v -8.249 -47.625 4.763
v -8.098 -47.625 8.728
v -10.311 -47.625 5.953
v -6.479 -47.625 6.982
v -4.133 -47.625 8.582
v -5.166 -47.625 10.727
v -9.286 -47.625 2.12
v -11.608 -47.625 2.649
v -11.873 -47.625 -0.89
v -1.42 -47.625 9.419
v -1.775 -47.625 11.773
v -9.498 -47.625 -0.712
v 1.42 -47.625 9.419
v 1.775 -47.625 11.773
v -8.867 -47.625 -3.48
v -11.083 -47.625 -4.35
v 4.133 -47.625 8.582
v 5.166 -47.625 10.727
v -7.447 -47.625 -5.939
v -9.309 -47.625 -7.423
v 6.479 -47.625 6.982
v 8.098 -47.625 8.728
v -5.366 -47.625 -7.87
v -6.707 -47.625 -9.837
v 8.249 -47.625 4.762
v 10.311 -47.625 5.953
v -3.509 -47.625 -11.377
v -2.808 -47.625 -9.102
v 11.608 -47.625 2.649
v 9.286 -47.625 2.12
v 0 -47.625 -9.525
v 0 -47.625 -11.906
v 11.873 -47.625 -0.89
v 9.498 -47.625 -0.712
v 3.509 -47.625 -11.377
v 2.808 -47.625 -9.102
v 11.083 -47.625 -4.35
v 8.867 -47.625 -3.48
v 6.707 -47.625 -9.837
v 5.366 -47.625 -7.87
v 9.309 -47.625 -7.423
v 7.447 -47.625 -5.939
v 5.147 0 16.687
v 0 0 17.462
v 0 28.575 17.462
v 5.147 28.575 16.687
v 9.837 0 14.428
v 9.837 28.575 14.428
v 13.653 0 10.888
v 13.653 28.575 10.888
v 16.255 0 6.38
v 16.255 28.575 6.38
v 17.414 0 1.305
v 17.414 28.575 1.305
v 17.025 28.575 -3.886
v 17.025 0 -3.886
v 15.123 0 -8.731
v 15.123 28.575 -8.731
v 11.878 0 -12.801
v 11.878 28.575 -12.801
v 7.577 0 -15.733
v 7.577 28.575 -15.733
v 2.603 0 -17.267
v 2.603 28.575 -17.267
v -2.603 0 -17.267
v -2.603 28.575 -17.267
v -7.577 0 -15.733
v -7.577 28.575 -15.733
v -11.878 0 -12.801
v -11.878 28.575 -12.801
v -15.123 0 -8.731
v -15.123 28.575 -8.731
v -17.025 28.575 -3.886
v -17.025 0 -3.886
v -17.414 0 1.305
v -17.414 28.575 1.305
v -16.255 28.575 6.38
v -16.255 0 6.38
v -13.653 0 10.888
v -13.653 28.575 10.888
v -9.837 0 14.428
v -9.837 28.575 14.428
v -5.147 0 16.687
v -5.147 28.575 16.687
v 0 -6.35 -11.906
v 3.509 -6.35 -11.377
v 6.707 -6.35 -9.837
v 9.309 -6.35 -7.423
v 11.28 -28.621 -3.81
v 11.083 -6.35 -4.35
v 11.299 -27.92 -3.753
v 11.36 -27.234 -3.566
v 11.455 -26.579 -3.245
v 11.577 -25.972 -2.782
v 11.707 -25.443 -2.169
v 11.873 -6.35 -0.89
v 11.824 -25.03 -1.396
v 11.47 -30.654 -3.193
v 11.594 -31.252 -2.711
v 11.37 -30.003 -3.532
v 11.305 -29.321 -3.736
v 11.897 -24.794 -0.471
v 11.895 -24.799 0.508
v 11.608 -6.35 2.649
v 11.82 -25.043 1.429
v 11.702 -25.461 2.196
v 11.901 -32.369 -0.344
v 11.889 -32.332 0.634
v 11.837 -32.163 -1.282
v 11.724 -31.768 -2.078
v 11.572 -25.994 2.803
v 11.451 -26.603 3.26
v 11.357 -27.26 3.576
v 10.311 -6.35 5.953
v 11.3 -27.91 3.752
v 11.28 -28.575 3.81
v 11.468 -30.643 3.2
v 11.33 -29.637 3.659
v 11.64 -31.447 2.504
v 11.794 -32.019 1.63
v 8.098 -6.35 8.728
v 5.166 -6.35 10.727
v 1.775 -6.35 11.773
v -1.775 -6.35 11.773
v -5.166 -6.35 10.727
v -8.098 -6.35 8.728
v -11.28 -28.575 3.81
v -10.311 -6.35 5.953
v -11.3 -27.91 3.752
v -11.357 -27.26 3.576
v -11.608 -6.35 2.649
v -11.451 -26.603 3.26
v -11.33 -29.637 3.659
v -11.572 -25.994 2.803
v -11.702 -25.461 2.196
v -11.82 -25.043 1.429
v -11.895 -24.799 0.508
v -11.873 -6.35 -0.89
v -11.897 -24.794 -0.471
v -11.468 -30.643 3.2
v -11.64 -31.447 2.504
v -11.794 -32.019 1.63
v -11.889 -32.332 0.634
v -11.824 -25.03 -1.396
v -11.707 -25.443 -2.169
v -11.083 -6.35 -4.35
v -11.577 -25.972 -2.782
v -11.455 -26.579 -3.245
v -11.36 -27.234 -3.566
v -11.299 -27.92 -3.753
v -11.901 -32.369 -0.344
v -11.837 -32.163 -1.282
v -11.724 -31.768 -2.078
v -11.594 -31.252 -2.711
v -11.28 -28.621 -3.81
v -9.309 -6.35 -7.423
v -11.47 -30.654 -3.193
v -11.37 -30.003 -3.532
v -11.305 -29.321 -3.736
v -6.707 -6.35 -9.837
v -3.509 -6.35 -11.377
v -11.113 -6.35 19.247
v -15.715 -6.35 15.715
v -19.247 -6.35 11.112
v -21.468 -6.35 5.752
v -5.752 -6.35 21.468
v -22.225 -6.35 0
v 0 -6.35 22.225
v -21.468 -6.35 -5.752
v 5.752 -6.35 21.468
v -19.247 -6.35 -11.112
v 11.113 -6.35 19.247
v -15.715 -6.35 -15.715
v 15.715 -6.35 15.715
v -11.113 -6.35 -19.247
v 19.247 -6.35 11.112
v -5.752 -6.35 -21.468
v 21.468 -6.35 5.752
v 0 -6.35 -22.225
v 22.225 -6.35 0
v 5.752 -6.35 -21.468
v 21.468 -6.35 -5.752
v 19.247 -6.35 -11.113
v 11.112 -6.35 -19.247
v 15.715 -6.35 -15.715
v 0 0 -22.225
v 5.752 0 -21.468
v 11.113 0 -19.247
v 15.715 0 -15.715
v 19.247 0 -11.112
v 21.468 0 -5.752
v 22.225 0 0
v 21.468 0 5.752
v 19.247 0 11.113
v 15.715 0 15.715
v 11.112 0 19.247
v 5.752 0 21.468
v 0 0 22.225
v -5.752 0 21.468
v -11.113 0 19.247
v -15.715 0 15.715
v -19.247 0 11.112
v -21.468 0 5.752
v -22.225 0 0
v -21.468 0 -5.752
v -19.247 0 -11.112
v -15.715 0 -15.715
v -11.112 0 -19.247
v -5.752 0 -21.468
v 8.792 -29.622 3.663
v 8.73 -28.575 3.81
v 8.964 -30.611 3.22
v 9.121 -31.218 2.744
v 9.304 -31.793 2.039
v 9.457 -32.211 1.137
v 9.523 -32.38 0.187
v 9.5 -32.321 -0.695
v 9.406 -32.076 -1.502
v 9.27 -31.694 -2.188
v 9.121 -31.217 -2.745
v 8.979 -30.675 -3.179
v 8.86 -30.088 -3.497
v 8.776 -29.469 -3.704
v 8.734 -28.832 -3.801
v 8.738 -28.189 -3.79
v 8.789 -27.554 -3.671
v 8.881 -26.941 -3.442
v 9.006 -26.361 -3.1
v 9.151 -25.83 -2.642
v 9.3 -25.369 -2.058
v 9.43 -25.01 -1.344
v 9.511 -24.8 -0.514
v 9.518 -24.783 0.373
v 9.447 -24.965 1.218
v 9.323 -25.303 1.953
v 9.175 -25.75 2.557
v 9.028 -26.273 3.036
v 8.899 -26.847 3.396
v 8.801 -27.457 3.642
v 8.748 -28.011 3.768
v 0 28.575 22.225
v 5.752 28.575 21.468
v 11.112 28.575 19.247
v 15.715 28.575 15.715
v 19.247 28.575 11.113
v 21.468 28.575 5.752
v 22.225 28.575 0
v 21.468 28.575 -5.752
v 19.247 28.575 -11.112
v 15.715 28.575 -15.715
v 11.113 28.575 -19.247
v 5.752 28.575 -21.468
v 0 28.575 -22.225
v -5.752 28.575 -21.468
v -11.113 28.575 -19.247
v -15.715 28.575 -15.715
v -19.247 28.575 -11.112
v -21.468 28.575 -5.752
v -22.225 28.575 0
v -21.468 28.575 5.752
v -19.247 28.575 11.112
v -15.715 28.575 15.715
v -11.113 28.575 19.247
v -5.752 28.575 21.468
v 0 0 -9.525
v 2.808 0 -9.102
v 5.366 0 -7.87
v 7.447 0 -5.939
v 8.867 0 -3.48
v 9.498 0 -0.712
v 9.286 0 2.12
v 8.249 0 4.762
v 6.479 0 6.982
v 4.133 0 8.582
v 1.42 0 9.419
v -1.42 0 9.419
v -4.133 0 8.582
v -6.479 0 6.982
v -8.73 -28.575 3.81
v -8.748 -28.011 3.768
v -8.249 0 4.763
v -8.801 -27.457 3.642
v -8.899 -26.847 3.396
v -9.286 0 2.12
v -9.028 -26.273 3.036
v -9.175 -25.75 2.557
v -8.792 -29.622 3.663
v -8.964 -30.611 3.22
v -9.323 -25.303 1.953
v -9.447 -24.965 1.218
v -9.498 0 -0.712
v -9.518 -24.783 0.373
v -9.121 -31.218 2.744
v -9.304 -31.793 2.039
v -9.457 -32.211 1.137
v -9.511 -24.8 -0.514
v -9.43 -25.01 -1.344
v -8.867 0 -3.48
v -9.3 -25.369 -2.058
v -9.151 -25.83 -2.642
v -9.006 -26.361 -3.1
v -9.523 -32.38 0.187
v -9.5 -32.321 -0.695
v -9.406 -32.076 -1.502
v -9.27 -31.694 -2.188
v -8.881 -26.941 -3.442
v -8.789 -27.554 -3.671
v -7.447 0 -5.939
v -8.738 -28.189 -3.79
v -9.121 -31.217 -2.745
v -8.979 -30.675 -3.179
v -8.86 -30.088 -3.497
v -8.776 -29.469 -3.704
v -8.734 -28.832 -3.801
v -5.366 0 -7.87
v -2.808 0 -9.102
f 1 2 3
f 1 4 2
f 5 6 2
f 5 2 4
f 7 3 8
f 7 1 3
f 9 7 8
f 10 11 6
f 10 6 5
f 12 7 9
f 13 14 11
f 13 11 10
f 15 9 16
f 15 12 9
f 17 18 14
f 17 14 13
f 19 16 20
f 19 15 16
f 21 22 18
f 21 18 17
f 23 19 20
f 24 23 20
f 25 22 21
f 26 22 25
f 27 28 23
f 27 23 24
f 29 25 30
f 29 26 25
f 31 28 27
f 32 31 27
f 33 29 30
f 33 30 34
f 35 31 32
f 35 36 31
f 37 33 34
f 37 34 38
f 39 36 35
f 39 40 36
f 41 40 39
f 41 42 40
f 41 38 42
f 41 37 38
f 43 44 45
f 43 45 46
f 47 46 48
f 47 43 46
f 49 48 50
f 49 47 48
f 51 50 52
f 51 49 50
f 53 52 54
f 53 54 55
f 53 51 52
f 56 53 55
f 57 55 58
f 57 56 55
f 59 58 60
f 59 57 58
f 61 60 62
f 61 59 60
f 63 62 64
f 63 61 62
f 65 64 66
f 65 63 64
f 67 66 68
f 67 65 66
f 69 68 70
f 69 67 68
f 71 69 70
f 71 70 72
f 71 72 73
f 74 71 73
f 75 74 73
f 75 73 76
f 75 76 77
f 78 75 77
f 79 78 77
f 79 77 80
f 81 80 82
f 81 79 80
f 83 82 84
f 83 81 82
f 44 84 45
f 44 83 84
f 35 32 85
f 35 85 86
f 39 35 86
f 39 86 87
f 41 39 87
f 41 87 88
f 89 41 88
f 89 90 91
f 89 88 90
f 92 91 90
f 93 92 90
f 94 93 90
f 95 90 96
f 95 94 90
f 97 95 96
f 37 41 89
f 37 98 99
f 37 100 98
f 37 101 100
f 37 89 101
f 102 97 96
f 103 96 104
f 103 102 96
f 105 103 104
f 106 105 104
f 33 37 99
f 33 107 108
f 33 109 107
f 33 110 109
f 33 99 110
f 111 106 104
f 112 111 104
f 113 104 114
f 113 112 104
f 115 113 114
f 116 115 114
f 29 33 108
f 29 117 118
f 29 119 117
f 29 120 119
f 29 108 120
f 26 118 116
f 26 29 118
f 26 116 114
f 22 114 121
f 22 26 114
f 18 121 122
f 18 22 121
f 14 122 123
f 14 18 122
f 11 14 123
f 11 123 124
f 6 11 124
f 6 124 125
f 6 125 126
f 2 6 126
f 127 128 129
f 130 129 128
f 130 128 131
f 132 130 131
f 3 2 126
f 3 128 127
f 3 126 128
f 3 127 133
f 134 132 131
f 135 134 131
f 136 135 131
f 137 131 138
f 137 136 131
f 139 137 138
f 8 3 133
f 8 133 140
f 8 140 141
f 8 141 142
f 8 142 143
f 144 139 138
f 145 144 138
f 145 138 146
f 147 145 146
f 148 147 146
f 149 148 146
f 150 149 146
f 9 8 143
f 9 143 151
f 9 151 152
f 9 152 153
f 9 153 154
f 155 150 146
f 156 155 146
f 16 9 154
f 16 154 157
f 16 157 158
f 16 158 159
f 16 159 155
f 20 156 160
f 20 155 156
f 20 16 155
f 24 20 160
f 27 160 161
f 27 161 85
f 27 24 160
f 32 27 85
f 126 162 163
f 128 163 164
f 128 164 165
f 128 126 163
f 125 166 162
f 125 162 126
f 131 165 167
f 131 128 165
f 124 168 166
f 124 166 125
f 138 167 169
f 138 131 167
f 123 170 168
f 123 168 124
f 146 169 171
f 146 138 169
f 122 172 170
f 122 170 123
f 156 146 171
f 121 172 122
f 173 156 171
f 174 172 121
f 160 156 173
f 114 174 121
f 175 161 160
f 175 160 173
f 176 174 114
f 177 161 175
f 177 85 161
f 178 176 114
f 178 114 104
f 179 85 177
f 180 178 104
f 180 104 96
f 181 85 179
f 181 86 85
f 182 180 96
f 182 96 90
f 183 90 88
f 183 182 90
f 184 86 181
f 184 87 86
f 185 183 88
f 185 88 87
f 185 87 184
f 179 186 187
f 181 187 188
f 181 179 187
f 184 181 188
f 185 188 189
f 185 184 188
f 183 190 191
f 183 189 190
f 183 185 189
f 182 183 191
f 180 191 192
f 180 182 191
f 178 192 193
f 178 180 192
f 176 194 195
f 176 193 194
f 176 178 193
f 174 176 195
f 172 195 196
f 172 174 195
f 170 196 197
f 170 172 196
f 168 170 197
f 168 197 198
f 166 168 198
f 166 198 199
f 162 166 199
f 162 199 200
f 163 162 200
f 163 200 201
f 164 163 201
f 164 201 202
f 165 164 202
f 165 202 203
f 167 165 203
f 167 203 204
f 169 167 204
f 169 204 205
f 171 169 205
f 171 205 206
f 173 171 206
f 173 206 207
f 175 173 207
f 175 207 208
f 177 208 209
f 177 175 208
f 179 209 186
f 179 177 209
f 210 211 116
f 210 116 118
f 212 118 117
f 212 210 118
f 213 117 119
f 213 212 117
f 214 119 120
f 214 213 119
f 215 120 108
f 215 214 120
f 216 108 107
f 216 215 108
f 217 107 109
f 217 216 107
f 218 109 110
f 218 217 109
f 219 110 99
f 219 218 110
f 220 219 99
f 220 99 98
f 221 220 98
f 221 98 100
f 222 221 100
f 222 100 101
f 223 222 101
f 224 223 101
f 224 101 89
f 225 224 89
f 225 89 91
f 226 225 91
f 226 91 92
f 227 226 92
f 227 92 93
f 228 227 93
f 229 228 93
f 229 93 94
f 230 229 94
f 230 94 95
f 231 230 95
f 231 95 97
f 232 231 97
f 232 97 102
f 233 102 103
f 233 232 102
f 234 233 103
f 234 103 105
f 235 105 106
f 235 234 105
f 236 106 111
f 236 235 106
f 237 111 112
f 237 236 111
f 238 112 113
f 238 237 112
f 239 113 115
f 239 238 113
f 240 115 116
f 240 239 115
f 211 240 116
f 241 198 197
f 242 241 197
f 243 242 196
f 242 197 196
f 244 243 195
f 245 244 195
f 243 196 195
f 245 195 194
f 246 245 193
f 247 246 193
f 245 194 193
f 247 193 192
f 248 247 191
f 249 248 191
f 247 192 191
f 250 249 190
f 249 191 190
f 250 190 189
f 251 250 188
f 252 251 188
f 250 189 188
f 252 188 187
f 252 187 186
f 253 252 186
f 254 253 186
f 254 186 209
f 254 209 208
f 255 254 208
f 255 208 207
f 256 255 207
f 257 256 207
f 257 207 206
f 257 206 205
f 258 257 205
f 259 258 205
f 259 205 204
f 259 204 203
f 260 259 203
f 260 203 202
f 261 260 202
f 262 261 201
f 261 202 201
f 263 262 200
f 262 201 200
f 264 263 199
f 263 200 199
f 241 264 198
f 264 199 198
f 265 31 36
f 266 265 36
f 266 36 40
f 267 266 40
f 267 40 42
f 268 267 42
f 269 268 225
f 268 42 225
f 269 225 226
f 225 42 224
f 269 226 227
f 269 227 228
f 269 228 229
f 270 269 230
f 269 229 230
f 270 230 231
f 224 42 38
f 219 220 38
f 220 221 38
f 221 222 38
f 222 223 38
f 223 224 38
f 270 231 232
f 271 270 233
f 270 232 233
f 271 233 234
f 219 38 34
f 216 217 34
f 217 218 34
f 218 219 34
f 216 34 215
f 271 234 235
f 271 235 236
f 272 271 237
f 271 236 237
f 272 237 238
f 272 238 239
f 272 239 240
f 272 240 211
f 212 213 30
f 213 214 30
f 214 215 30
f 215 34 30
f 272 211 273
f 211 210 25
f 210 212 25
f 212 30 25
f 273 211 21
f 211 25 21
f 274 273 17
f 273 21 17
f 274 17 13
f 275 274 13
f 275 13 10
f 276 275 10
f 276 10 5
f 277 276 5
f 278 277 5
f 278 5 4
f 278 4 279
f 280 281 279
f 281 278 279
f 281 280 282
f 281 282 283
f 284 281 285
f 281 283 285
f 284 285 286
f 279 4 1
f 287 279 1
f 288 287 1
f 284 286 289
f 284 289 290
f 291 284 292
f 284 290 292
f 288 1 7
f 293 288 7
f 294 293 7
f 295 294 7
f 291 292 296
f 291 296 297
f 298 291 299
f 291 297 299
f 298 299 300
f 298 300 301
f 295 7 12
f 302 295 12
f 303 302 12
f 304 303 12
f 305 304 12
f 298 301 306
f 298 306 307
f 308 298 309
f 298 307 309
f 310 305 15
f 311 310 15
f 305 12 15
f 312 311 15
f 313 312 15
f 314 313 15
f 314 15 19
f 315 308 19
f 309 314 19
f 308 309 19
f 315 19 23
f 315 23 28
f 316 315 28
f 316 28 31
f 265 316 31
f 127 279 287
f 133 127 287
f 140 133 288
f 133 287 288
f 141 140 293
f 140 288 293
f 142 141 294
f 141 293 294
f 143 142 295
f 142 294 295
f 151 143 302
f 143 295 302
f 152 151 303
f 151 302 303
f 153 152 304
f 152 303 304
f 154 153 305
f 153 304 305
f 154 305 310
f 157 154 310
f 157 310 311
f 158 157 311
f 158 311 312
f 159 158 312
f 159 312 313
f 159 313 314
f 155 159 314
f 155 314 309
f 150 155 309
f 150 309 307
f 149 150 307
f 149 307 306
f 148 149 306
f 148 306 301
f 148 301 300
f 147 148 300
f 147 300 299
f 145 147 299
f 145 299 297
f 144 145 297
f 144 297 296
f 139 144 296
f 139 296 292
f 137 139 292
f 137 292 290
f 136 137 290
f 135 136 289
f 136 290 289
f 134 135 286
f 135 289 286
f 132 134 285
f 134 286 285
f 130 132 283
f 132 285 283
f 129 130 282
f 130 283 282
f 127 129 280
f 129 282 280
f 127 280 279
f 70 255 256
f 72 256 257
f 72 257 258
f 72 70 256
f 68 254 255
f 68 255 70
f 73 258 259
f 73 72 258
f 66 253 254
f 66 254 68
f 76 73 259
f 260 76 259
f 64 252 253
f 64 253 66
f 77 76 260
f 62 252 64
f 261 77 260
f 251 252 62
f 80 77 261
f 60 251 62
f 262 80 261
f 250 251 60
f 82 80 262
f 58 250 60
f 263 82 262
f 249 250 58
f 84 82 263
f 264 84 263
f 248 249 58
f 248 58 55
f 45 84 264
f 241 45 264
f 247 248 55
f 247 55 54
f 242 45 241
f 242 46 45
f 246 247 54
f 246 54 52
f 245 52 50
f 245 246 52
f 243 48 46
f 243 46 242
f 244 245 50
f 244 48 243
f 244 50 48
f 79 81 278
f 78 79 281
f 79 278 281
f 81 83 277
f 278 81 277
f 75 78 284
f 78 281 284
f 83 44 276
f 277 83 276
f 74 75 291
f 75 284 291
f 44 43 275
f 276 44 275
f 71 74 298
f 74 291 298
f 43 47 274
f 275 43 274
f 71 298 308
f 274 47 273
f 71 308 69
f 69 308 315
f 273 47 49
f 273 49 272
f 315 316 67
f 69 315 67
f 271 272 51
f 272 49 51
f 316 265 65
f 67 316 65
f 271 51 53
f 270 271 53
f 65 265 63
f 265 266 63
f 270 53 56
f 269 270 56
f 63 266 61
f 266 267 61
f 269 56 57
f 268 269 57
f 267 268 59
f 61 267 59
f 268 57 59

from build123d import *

# Parameters (mm, degrees)
SKETCH1_R            = 22.225
SKETCH1_R_2          = 17.4625
SPRING_CHAMBER_DEPTH = 28.575
BALL_CHAMBER_START   = 47.625
SKETCH2_R            = 22.225
SKETCH2_R_2          = 9.525
BALL_CHAMBER_DEPTH   = 47.625
SKETCH5_R            = 3.81
BALL_HOLE_DEPTH      = 58.061737399
SKETCH8_R            = 22.225
SKETCH8_R_2          = 11.90625
CUT_EXTRUDE2_DEPTH   = 41.275


with BuildPart() as part:
    # Sketch1 → spring_chamber (new body)
    with BuildSketch(Plane(origin=(0, 0, 0), x_dir=(1, 0, 0), z_dir=(0, 1, 0))):
        with Locations(Location((0, 0, 0), (0, 0, 270))):
            Circle(SKETCH1_R)
        with Locations(Location((0, 0, 0), (0, 0, 270))):
            Circle(SKETCH1_R_2, mode=Mode.SUBTRACT)
    extrude(amount=SPRING_CHAMBER_DEPTH)

    # Sketch2 → ball_chamber (add)
    with BuildSketch(Plane.XZ.offset(BALL_CHAMBER_START)):
        with Locations(Location((0, 0, 0), (0, 0, 270))):
            Circle(SKETCH2_R)
        with Locations(Location((0, 0, 0), (0, 0, 270))):
            Circle(SKETCH2_R_2, mode=Mode.SUBTRACT)
    extrude(amount=-BALL_CHAMBER_DEPTH)

    # Sketch5 → ball_hole (cut, through all)
    with BuildSketch(Plane(origin=(0, 0, 0), x_dir=(0, 0, -1), z_dir=(1, 0, 0))):
        with Locations(Location((0, -28.575, 0), (0, 0, 180))):
            Circle(SKETCH5_R)
    ball_hole = extrude(amount=BALL_HOLE_DEPTH, mode=Mode.SUBTRACT)

    # Sketch8 → Cut-Extrude2 (cut)
    with BuildSketch(Plane.XZ.offset(47.625)):
        with Locations(Location((0, 0, 0), (0, 0, 270))):
            Circle(SKETCH8_R)
        with Locations(Location((0, 0, 0), (0, 0, 270))):
            Circle(SKETCH8_R_2, mode=Mode.SUBTRACT)
    extrude(amount=-CUT_EXTRUDE2_DEPTH, mode=Mode.SUBTRACT)

    # Mirror1: ball_hole across plane
    add(ball_hole.mirror(Plane(origin=(0, 0, 0), x_dir=(0, 0, 1), z_dir=(1, 0, 0))), mode=Mode.SUBTRACT)


solid = part.part
